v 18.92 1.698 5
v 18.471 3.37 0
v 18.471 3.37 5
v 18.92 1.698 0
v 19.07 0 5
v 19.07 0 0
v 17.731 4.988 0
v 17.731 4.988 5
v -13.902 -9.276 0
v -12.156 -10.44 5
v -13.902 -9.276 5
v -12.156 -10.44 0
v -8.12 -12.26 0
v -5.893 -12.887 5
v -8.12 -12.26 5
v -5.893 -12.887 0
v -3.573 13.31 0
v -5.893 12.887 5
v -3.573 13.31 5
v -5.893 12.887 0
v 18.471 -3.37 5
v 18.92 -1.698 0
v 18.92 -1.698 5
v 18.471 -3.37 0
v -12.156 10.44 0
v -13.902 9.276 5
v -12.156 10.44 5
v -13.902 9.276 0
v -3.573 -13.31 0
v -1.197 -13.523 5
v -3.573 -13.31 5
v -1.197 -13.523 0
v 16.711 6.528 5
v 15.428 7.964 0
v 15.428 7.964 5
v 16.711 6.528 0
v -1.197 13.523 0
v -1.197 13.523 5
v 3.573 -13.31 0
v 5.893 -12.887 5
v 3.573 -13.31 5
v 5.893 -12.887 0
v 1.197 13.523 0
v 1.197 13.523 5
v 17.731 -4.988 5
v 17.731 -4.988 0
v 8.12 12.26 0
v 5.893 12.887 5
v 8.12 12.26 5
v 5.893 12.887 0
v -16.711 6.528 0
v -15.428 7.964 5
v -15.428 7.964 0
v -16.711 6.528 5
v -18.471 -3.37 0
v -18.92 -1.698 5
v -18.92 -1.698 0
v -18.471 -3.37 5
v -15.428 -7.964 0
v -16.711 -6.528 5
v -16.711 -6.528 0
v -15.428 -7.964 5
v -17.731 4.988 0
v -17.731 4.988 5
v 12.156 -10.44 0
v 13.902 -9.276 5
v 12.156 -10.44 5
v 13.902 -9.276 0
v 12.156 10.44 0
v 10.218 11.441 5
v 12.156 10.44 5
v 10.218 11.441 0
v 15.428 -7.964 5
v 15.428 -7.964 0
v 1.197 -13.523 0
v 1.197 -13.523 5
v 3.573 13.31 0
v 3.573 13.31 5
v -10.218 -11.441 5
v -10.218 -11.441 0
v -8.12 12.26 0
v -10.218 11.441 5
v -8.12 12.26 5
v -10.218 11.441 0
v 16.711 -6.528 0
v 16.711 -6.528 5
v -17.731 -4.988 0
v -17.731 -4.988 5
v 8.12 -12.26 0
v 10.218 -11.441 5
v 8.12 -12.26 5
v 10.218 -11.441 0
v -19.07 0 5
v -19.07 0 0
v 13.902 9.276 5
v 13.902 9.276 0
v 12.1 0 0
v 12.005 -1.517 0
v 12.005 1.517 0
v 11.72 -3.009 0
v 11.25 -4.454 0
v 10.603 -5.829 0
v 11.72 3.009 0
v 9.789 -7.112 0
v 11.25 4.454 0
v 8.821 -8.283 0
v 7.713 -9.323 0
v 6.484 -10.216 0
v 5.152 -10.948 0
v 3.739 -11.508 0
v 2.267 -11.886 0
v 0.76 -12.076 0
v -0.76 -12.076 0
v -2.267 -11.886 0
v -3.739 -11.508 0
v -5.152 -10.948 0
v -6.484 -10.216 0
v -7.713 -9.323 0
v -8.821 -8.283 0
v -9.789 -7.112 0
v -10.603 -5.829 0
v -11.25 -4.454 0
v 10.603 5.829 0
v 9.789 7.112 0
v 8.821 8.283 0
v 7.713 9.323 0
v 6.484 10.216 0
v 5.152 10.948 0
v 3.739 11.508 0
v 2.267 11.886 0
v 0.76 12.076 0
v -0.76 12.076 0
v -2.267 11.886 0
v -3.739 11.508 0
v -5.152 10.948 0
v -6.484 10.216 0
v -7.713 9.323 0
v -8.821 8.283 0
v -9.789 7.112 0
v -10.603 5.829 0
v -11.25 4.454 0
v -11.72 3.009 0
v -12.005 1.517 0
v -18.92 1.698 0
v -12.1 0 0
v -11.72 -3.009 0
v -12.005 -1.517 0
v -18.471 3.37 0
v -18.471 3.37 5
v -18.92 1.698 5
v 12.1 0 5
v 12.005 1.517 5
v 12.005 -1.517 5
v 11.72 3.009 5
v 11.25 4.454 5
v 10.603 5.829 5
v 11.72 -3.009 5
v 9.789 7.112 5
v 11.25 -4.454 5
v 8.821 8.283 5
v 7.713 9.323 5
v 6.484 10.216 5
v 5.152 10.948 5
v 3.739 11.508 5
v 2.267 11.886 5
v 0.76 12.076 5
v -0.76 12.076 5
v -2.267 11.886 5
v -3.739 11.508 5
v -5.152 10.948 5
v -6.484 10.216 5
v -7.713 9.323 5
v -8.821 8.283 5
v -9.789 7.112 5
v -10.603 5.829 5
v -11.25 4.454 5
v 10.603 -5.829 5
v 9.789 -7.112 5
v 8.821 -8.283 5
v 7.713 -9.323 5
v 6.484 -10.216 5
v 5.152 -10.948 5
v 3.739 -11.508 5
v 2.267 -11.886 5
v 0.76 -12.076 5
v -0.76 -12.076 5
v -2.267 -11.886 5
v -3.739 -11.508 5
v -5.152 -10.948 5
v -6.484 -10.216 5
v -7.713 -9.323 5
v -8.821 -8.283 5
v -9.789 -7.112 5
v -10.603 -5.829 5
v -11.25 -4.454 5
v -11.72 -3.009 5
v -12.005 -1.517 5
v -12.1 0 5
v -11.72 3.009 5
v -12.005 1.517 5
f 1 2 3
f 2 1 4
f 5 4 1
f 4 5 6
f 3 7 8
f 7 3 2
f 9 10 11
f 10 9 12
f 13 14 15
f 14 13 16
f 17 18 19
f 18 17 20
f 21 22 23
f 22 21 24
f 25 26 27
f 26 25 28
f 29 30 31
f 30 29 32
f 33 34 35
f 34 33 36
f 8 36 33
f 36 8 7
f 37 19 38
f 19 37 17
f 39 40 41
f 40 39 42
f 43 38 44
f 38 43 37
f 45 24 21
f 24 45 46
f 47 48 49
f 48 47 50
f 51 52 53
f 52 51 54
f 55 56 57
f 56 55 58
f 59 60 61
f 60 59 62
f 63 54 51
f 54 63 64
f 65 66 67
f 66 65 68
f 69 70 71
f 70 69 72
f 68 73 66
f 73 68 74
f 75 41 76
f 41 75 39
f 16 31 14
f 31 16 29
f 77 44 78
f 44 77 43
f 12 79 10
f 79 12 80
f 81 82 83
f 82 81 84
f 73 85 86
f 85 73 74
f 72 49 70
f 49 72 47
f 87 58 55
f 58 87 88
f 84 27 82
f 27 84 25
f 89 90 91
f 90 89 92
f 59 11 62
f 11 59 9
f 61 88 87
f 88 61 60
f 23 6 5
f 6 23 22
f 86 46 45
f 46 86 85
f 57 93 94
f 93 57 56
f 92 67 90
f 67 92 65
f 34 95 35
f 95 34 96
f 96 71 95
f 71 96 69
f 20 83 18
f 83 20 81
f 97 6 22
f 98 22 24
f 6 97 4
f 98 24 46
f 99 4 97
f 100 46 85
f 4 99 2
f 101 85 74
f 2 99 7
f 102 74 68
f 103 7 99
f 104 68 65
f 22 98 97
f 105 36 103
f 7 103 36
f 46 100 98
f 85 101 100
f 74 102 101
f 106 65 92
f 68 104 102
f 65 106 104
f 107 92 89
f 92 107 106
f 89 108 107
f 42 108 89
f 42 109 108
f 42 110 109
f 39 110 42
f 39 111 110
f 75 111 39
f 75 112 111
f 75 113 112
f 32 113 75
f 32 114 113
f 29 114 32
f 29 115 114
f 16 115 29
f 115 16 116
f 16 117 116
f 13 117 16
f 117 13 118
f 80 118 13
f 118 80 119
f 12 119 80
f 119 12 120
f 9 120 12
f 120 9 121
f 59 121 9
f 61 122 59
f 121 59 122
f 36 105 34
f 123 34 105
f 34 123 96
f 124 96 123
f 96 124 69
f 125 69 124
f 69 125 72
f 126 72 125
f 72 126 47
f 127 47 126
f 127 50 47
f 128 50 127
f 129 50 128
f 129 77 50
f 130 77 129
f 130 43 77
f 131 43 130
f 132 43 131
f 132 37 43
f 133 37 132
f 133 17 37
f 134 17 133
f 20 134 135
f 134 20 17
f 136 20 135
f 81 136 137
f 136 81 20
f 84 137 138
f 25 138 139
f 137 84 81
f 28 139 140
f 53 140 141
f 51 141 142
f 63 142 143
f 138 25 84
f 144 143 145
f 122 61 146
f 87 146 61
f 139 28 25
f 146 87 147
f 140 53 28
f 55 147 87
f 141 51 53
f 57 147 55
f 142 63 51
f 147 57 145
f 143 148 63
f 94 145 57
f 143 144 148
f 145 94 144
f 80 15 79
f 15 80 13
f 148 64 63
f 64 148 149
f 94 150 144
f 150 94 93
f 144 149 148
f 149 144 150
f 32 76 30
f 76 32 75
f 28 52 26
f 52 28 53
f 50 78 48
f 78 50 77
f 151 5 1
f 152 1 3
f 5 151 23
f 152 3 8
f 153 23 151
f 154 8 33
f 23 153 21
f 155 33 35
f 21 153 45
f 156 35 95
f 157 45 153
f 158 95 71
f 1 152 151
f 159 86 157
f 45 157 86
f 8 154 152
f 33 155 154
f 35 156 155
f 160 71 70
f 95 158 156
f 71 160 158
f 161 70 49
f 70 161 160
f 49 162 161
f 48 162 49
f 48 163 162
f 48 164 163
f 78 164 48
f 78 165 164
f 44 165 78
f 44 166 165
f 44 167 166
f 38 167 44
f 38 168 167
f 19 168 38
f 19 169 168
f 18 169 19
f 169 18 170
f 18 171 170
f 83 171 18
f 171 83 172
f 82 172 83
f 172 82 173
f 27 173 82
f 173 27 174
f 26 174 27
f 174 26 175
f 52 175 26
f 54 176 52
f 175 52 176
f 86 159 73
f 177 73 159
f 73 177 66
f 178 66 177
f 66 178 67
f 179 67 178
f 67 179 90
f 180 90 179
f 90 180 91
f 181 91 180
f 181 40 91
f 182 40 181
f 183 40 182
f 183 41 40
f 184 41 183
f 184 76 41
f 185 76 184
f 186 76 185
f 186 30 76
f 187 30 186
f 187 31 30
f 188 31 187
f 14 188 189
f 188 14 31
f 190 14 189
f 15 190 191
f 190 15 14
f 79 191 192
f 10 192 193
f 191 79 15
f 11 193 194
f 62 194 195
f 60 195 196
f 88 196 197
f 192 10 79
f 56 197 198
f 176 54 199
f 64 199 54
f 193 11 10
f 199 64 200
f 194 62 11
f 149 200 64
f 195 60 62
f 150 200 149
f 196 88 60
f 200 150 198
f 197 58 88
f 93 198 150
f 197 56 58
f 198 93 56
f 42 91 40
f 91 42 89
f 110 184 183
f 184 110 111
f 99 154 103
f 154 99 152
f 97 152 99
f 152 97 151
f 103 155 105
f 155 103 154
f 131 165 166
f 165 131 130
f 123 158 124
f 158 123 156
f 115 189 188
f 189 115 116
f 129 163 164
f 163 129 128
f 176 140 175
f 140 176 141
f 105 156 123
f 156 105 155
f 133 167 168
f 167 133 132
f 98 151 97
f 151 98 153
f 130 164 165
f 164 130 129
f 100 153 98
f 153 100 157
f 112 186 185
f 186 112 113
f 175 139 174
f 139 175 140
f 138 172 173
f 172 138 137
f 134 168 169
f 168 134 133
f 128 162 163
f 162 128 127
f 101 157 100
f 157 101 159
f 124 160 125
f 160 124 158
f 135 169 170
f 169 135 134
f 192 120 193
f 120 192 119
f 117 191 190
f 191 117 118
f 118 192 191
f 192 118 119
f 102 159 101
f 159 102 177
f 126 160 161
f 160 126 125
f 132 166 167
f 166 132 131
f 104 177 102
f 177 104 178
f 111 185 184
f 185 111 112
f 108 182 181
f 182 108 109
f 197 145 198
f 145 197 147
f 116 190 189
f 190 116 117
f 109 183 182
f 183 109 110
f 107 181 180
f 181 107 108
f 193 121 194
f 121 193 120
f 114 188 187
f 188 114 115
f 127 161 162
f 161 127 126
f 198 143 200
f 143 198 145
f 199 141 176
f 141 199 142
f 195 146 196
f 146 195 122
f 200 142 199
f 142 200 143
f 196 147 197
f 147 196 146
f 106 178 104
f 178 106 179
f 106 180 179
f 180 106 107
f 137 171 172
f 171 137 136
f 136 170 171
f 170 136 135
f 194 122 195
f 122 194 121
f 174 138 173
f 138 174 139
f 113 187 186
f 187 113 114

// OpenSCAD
$fn=50;

difference()
{
	scale([38/27,1,1]) cylinder(h=5, d=27 + 0.1);
	translate([0,0,-0.01]) cylinder(h=5 + 0.02, d=24 + 0.2);
}
